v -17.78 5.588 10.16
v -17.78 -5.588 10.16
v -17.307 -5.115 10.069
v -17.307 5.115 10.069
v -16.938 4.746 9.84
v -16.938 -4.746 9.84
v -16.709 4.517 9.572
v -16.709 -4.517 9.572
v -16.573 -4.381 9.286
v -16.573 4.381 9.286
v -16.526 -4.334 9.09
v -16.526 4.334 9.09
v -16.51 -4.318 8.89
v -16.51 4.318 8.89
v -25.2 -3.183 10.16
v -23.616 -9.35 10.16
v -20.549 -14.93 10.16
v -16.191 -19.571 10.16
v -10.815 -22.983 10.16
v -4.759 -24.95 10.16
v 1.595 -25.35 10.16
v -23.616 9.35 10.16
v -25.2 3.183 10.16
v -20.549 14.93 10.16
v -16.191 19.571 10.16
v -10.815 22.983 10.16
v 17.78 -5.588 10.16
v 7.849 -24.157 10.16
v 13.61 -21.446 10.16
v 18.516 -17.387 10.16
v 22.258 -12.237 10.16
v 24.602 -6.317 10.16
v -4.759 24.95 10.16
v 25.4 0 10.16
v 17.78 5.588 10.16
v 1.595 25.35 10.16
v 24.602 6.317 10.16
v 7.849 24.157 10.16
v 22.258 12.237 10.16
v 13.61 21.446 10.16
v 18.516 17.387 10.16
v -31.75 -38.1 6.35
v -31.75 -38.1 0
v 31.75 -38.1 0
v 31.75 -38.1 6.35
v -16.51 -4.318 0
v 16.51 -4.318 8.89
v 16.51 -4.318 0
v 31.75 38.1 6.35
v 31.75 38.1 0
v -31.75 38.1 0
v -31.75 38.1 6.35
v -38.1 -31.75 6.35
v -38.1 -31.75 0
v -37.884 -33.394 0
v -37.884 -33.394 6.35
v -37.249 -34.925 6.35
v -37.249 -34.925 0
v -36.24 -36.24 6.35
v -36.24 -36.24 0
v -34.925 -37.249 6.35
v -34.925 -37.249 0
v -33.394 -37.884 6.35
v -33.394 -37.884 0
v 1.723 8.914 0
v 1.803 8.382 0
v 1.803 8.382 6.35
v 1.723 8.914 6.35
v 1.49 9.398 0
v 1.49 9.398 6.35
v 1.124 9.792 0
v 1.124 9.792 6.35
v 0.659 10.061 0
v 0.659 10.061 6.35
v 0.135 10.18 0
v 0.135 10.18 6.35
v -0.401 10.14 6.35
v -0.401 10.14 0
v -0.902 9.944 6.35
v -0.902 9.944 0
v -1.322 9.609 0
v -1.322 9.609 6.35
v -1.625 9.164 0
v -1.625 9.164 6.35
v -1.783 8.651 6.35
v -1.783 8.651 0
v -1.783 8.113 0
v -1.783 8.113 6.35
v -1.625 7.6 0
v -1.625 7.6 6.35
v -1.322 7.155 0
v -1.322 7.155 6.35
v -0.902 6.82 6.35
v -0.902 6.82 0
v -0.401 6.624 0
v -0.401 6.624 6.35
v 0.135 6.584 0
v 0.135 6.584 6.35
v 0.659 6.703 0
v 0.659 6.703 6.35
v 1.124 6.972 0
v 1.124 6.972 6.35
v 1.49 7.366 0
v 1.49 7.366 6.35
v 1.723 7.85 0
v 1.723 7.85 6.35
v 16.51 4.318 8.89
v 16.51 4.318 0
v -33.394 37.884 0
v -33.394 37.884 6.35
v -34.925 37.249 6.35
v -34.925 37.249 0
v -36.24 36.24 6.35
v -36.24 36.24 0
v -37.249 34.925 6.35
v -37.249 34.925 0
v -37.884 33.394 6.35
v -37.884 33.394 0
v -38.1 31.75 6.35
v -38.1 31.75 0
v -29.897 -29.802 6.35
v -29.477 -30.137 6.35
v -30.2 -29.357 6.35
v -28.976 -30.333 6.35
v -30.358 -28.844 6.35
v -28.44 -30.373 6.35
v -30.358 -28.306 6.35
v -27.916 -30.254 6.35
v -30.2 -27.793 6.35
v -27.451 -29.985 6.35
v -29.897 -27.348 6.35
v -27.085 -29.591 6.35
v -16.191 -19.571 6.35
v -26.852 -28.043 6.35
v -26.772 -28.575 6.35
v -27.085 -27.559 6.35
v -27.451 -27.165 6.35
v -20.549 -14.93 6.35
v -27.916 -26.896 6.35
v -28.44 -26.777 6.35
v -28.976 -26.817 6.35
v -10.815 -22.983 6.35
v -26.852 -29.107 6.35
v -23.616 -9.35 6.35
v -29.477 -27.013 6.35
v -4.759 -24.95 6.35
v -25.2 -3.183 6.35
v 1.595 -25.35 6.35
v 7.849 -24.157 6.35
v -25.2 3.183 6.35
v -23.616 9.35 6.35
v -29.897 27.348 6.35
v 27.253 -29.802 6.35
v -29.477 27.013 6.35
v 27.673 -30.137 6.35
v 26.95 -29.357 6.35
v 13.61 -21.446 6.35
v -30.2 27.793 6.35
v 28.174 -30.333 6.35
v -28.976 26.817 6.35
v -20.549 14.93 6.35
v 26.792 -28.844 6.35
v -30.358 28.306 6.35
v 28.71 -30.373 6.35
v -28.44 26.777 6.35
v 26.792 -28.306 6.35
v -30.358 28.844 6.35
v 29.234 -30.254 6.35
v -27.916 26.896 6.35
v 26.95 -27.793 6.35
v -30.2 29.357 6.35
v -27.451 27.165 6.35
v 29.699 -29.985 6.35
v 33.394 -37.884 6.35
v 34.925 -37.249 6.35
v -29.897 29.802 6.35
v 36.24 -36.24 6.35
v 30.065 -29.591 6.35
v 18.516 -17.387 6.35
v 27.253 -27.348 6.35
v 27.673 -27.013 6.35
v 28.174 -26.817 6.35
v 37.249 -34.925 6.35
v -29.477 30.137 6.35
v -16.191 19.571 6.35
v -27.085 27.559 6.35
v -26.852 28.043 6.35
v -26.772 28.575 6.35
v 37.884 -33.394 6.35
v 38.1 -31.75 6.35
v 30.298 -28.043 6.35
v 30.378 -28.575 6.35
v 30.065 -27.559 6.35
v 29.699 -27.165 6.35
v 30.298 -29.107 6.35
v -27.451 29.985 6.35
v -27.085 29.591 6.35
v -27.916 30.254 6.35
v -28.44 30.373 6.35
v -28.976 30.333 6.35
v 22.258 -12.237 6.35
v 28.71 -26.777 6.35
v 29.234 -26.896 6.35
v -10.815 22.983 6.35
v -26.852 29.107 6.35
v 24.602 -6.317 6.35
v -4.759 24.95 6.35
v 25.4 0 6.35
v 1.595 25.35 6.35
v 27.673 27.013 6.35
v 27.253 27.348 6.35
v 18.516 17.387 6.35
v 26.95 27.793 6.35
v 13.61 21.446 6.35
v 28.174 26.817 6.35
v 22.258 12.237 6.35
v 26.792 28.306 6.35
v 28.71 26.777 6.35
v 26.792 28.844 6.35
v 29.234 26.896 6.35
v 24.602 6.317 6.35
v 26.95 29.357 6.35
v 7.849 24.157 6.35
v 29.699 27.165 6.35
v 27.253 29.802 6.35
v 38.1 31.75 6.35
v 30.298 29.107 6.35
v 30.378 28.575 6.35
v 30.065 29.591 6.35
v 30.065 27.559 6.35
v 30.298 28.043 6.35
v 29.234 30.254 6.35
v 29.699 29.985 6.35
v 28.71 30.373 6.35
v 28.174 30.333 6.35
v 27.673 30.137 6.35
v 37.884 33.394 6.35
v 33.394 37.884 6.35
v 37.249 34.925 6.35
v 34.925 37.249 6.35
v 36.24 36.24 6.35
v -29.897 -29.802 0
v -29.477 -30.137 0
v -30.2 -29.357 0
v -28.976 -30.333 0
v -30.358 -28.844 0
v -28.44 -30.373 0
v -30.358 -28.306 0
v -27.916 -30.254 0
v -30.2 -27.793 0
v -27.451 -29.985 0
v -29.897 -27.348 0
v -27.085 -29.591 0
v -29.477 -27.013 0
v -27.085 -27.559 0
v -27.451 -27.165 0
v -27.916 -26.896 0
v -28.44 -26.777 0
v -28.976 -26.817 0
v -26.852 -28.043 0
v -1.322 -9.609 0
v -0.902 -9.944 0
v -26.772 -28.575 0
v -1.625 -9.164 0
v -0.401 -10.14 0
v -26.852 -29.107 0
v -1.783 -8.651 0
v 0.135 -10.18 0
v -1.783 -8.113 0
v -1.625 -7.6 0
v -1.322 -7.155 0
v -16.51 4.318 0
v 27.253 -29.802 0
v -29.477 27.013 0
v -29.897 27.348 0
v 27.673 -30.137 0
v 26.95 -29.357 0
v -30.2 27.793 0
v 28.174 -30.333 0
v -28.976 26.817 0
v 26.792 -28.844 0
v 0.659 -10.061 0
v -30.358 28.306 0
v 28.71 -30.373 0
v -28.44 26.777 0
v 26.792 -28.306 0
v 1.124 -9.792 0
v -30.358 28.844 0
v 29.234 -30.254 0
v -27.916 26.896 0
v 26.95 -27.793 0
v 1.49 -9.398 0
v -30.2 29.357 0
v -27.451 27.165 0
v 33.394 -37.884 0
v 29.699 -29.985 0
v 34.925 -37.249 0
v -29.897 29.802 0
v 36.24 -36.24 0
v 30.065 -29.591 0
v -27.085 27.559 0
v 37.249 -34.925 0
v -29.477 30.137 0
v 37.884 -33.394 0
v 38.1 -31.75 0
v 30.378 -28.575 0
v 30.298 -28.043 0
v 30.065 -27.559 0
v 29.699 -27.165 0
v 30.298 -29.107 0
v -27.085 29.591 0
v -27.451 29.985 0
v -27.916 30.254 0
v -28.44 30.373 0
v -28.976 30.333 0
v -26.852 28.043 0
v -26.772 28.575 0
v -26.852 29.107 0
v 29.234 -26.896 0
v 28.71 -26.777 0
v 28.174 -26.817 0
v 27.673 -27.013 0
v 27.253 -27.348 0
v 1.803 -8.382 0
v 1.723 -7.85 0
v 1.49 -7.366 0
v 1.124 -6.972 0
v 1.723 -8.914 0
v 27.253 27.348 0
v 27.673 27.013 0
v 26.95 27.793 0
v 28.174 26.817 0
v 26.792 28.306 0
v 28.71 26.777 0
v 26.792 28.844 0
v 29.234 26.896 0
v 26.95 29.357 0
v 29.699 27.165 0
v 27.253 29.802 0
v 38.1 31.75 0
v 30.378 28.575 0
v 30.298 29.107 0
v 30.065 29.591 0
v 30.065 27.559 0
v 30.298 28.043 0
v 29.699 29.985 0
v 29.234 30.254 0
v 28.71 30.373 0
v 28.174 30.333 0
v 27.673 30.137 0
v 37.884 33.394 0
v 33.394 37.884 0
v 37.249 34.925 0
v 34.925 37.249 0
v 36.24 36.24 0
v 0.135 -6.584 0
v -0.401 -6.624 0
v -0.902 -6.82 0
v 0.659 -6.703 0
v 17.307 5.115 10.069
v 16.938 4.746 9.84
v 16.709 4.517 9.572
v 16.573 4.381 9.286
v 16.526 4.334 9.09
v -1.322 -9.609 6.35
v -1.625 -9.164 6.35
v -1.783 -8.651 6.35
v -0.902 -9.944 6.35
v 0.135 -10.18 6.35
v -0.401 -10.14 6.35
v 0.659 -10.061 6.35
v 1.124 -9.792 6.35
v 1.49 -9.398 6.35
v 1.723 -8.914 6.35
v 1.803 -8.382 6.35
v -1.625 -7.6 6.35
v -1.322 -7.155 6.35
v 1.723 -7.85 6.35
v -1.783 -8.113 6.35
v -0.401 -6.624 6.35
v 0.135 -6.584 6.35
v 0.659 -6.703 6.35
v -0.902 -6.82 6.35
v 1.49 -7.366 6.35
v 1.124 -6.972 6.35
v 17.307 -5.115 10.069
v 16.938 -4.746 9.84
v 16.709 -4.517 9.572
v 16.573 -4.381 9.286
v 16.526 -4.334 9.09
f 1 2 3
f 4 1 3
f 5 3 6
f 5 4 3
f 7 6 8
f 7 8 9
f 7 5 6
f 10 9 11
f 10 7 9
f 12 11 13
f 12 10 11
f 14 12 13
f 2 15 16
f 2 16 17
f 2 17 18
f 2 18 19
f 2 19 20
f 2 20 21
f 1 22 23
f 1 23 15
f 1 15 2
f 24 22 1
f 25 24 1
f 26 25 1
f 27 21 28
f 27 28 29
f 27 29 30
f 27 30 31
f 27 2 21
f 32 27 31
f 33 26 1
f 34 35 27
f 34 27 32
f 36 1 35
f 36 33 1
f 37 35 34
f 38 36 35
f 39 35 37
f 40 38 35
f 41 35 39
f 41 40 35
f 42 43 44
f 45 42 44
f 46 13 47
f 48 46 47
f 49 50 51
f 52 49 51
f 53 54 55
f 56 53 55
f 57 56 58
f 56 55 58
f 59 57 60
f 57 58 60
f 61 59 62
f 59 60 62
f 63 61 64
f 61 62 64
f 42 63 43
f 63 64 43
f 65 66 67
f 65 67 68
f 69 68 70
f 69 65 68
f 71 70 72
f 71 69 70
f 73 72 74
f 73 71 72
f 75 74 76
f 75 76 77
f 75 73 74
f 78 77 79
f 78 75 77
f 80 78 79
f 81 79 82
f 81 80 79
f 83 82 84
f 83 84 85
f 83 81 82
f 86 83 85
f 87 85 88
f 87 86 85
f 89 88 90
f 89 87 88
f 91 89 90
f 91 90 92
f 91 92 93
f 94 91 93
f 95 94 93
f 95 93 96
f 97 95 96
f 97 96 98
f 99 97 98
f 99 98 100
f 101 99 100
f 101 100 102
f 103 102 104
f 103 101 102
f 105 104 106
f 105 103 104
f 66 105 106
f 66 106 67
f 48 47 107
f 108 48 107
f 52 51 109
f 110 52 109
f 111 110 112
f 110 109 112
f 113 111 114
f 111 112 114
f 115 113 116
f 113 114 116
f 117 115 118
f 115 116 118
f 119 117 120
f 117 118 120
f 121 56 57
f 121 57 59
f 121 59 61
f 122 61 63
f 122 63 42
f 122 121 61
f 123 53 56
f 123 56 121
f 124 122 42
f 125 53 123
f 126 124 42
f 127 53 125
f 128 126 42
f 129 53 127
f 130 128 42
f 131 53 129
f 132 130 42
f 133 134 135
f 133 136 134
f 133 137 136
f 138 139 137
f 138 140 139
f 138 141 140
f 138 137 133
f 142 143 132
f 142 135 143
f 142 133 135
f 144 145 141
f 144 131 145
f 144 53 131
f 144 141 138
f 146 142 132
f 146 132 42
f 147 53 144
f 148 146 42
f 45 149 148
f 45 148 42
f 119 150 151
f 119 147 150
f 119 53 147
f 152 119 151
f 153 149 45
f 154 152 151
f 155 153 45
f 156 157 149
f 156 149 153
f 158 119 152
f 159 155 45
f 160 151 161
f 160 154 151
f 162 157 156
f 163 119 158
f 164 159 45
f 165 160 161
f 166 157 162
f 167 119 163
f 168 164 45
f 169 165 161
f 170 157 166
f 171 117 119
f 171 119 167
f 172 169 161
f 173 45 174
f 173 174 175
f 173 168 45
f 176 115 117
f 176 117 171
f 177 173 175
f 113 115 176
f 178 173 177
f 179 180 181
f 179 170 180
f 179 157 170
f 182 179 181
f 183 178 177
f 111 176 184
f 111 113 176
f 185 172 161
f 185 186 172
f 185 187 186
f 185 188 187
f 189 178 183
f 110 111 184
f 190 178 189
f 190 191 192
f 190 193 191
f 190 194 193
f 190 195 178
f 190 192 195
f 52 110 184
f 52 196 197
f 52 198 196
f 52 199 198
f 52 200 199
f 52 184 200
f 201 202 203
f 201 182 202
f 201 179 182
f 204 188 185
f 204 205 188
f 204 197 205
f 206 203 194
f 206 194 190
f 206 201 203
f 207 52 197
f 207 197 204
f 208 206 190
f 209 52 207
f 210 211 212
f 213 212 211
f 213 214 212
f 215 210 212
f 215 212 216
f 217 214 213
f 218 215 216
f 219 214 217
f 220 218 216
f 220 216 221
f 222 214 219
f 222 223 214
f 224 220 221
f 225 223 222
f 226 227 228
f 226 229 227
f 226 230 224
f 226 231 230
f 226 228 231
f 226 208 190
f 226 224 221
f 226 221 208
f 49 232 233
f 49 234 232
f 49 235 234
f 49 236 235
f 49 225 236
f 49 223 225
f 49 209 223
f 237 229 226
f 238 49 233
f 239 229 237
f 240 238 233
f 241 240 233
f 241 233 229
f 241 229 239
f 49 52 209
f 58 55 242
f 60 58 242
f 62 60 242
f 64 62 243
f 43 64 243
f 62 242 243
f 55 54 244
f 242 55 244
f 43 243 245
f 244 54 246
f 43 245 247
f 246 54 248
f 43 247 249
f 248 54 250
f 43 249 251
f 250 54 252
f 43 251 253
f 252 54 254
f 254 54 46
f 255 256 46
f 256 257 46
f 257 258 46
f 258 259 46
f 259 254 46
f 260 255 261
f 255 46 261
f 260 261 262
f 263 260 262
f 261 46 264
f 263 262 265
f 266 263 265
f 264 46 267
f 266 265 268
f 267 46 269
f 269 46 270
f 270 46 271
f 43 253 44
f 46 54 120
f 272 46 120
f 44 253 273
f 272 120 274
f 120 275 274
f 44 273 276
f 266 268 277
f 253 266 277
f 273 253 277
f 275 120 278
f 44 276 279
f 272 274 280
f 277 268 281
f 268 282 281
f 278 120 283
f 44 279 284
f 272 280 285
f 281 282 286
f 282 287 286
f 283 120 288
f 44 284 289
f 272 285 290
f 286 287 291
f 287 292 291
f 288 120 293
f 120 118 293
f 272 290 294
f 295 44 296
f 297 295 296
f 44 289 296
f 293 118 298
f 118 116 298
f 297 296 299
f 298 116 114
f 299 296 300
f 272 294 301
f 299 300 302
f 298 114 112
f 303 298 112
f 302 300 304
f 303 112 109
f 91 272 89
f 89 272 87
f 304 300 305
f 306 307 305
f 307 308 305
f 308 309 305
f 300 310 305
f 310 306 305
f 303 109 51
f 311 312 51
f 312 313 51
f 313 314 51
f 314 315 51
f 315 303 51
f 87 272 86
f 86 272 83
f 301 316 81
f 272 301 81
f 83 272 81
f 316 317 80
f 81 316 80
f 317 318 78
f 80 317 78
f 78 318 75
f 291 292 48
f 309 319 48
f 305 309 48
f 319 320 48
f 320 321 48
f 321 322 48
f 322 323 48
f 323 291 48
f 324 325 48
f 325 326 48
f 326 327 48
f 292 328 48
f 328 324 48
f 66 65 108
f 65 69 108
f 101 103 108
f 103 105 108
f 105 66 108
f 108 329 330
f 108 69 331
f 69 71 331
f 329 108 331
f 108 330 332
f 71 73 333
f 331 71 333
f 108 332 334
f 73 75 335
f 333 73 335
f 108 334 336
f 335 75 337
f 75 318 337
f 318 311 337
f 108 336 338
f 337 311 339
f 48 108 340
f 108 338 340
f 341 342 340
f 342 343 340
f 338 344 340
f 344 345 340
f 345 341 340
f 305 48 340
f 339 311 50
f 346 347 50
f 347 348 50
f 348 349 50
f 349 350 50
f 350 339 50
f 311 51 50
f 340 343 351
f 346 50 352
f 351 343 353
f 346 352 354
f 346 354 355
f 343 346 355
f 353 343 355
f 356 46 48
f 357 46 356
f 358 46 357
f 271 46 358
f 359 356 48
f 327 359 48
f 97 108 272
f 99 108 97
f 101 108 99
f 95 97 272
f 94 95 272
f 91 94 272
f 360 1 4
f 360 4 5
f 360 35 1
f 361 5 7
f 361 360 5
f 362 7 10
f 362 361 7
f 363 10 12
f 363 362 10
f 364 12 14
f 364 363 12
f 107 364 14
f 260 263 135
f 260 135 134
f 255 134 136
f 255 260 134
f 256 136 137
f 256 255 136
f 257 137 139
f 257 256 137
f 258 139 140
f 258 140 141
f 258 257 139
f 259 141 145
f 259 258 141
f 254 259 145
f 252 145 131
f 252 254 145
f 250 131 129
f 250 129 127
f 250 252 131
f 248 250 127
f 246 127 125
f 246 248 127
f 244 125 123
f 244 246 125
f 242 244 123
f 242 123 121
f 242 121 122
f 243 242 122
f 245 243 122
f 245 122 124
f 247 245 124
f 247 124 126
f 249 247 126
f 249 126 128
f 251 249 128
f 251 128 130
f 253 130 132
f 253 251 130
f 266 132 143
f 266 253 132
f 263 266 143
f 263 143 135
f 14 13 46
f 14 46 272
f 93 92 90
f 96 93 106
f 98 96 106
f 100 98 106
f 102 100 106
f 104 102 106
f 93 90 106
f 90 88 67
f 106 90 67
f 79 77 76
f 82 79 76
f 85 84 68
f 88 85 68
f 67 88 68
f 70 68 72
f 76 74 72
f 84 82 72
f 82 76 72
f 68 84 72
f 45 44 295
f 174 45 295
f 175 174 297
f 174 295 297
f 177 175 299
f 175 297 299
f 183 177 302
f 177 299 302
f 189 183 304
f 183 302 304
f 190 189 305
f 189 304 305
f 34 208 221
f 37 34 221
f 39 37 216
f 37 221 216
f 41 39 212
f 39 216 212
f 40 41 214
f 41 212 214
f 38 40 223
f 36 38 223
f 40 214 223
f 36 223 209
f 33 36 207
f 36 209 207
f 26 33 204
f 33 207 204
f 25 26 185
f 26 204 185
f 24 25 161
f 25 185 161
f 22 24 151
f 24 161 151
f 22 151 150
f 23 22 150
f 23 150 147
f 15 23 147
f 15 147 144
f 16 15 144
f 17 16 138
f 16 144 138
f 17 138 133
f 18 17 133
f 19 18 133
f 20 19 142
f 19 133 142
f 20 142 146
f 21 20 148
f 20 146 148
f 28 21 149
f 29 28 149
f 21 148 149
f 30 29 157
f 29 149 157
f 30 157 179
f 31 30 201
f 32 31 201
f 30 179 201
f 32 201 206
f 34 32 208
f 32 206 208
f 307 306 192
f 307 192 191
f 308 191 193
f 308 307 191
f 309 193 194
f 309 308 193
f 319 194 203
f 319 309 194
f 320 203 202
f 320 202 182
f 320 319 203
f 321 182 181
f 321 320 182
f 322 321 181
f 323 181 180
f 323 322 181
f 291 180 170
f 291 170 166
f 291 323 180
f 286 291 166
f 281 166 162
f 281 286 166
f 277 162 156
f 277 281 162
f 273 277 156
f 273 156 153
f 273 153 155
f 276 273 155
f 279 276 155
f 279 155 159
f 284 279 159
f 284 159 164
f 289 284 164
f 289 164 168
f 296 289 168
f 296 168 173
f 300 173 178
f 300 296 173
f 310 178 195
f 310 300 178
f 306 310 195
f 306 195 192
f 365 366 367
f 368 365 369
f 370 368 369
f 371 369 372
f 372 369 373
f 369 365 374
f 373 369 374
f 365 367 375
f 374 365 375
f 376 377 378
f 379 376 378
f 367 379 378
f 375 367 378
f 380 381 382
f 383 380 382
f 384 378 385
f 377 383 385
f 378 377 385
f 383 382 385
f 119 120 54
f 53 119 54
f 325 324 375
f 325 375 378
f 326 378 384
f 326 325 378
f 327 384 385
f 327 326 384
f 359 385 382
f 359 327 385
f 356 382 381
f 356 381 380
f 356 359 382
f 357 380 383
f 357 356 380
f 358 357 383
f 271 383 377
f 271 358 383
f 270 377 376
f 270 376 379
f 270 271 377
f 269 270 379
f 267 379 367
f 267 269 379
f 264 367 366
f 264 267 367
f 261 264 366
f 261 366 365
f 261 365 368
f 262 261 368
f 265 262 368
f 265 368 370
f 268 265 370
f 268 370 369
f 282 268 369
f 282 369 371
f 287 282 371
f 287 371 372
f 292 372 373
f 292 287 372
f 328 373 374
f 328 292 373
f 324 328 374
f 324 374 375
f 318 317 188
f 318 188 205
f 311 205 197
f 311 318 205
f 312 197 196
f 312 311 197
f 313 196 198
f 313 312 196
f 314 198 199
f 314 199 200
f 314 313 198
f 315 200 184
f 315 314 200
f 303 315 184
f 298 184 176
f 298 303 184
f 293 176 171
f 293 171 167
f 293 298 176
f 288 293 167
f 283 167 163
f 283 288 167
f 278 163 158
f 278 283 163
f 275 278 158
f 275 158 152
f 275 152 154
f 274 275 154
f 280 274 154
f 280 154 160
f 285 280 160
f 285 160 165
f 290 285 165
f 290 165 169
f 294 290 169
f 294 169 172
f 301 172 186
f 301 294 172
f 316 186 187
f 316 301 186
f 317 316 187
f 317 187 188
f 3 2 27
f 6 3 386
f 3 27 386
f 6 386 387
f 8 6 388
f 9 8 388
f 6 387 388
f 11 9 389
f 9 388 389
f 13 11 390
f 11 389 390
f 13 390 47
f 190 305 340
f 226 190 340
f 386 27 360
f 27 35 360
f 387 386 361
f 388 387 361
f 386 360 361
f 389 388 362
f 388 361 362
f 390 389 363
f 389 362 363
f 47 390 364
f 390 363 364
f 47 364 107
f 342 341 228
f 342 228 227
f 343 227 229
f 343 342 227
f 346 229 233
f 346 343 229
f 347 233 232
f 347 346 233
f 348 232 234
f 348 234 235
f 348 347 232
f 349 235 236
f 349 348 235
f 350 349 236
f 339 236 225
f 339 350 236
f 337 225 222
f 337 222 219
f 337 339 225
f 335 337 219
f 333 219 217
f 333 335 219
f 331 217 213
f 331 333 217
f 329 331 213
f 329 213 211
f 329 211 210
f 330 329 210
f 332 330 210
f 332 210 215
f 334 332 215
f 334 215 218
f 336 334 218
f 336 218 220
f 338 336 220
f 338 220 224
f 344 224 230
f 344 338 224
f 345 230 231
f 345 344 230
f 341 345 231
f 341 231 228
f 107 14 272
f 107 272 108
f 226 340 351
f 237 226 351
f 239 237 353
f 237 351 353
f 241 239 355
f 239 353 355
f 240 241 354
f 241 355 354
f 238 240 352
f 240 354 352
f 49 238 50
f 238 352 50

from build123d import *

# Parameters (mm, degrees)
F0_R     = 1.8034
F0_R_2   = 25.4
F0_W     = 33.02
F0_H     = 8.636
F1_DEPTH = 6.35
F2_R     = 25.4
F3_DEPTH = 3.81
F4_DEPTH = 12.7
F5_R     = 1.27


# Not quite as in the source:
# - a feature names something its author has since deleted; it is built from what else it names


with BuildPart() as f1:
    # F0 (on Top) → F1 (new body)
    with BuildSketch(Plane.XY):
        with BuildLine():
            Line((-31.75, -38.1), (31.75, -38.1))
            ThreePointArc((31.75, -38.1), (36.2401280605, -36.2401280605), (38.1, -31.75))
            Line((38.1, -31.75), (38.1, 31.75))
            ThreePointArc((38.1, 31.75), (36.2401280605, 36.2401280605), (31.75, 38.1))
            Line((31.75, 38.1), (-31.75, 38.1))
            ThreePointArc((-31.75, 38.1), (-36.2401280605, 36.2401280605), (-38.1, 31.75))
            Line((-38.1, 31.75), (-38.1, -31.75))
            ThreePointArc((-38.1, -31.75), (-36.2401280605, -36.2401280605), (-31.75, -38.1))
        make_face()
        with Locations((-28.575, -28.575)):
            Circle(F0_R, mode=Mode.SUBTRACT)
        with Locations((28.575, -28.575)):
            Circle(F0_R, mode=Mode.SUBTRACT)
        with Locations((-28.575, 28.575)):
            Circle(F0_R, mode=Mode.SUBTRACT)
        Circle(F0_R_2, mode=Mode.SUBTRACT)
        with Locations((28.575, 28.575)):
            Circle(F0_R, mode=Mode.SUBTRACT)
        Circle(F0_R_2)
        with Locations((0, -8.382)):
            Circle(F0_R, mode=Mode.SUBTRACT)
        Rectangle(F0_W, F0_H, mode=Mode.SUBTRACT)
        with Locations((0, 8.382)):
            Circle(F0_R, mode=Mode.SUBTRACT)
    extrude(amount=F1_DEPTH)

    # F2 (on face) → F3 (join)
    with BuildSketch(Plane.XY.offset(6.35)):
        Circle(F2_R)
    extrude(amount=F3_DEPTH)

    # F0 (on Top) → F4 (cut, symmetric)
    with BuildSketch(Plane.XY):
        Rectangle(F0_W, F0_H)
    extrude(amount=F4_DEPTH, both=True, mode=Mode.SUBTRACT)

    # F5
    f5_edges = [f1.edges().sort_by_distance(p)[0] for p in [
        (0, 4.318, 10.16),
        (-16.51, 0, 10.16),
        (0, -4.318, 10.16),
        (16.51, 0, 10.16),
    ]]
    fillet(f5_edges, radius=F5_R)


solid = f1.part
